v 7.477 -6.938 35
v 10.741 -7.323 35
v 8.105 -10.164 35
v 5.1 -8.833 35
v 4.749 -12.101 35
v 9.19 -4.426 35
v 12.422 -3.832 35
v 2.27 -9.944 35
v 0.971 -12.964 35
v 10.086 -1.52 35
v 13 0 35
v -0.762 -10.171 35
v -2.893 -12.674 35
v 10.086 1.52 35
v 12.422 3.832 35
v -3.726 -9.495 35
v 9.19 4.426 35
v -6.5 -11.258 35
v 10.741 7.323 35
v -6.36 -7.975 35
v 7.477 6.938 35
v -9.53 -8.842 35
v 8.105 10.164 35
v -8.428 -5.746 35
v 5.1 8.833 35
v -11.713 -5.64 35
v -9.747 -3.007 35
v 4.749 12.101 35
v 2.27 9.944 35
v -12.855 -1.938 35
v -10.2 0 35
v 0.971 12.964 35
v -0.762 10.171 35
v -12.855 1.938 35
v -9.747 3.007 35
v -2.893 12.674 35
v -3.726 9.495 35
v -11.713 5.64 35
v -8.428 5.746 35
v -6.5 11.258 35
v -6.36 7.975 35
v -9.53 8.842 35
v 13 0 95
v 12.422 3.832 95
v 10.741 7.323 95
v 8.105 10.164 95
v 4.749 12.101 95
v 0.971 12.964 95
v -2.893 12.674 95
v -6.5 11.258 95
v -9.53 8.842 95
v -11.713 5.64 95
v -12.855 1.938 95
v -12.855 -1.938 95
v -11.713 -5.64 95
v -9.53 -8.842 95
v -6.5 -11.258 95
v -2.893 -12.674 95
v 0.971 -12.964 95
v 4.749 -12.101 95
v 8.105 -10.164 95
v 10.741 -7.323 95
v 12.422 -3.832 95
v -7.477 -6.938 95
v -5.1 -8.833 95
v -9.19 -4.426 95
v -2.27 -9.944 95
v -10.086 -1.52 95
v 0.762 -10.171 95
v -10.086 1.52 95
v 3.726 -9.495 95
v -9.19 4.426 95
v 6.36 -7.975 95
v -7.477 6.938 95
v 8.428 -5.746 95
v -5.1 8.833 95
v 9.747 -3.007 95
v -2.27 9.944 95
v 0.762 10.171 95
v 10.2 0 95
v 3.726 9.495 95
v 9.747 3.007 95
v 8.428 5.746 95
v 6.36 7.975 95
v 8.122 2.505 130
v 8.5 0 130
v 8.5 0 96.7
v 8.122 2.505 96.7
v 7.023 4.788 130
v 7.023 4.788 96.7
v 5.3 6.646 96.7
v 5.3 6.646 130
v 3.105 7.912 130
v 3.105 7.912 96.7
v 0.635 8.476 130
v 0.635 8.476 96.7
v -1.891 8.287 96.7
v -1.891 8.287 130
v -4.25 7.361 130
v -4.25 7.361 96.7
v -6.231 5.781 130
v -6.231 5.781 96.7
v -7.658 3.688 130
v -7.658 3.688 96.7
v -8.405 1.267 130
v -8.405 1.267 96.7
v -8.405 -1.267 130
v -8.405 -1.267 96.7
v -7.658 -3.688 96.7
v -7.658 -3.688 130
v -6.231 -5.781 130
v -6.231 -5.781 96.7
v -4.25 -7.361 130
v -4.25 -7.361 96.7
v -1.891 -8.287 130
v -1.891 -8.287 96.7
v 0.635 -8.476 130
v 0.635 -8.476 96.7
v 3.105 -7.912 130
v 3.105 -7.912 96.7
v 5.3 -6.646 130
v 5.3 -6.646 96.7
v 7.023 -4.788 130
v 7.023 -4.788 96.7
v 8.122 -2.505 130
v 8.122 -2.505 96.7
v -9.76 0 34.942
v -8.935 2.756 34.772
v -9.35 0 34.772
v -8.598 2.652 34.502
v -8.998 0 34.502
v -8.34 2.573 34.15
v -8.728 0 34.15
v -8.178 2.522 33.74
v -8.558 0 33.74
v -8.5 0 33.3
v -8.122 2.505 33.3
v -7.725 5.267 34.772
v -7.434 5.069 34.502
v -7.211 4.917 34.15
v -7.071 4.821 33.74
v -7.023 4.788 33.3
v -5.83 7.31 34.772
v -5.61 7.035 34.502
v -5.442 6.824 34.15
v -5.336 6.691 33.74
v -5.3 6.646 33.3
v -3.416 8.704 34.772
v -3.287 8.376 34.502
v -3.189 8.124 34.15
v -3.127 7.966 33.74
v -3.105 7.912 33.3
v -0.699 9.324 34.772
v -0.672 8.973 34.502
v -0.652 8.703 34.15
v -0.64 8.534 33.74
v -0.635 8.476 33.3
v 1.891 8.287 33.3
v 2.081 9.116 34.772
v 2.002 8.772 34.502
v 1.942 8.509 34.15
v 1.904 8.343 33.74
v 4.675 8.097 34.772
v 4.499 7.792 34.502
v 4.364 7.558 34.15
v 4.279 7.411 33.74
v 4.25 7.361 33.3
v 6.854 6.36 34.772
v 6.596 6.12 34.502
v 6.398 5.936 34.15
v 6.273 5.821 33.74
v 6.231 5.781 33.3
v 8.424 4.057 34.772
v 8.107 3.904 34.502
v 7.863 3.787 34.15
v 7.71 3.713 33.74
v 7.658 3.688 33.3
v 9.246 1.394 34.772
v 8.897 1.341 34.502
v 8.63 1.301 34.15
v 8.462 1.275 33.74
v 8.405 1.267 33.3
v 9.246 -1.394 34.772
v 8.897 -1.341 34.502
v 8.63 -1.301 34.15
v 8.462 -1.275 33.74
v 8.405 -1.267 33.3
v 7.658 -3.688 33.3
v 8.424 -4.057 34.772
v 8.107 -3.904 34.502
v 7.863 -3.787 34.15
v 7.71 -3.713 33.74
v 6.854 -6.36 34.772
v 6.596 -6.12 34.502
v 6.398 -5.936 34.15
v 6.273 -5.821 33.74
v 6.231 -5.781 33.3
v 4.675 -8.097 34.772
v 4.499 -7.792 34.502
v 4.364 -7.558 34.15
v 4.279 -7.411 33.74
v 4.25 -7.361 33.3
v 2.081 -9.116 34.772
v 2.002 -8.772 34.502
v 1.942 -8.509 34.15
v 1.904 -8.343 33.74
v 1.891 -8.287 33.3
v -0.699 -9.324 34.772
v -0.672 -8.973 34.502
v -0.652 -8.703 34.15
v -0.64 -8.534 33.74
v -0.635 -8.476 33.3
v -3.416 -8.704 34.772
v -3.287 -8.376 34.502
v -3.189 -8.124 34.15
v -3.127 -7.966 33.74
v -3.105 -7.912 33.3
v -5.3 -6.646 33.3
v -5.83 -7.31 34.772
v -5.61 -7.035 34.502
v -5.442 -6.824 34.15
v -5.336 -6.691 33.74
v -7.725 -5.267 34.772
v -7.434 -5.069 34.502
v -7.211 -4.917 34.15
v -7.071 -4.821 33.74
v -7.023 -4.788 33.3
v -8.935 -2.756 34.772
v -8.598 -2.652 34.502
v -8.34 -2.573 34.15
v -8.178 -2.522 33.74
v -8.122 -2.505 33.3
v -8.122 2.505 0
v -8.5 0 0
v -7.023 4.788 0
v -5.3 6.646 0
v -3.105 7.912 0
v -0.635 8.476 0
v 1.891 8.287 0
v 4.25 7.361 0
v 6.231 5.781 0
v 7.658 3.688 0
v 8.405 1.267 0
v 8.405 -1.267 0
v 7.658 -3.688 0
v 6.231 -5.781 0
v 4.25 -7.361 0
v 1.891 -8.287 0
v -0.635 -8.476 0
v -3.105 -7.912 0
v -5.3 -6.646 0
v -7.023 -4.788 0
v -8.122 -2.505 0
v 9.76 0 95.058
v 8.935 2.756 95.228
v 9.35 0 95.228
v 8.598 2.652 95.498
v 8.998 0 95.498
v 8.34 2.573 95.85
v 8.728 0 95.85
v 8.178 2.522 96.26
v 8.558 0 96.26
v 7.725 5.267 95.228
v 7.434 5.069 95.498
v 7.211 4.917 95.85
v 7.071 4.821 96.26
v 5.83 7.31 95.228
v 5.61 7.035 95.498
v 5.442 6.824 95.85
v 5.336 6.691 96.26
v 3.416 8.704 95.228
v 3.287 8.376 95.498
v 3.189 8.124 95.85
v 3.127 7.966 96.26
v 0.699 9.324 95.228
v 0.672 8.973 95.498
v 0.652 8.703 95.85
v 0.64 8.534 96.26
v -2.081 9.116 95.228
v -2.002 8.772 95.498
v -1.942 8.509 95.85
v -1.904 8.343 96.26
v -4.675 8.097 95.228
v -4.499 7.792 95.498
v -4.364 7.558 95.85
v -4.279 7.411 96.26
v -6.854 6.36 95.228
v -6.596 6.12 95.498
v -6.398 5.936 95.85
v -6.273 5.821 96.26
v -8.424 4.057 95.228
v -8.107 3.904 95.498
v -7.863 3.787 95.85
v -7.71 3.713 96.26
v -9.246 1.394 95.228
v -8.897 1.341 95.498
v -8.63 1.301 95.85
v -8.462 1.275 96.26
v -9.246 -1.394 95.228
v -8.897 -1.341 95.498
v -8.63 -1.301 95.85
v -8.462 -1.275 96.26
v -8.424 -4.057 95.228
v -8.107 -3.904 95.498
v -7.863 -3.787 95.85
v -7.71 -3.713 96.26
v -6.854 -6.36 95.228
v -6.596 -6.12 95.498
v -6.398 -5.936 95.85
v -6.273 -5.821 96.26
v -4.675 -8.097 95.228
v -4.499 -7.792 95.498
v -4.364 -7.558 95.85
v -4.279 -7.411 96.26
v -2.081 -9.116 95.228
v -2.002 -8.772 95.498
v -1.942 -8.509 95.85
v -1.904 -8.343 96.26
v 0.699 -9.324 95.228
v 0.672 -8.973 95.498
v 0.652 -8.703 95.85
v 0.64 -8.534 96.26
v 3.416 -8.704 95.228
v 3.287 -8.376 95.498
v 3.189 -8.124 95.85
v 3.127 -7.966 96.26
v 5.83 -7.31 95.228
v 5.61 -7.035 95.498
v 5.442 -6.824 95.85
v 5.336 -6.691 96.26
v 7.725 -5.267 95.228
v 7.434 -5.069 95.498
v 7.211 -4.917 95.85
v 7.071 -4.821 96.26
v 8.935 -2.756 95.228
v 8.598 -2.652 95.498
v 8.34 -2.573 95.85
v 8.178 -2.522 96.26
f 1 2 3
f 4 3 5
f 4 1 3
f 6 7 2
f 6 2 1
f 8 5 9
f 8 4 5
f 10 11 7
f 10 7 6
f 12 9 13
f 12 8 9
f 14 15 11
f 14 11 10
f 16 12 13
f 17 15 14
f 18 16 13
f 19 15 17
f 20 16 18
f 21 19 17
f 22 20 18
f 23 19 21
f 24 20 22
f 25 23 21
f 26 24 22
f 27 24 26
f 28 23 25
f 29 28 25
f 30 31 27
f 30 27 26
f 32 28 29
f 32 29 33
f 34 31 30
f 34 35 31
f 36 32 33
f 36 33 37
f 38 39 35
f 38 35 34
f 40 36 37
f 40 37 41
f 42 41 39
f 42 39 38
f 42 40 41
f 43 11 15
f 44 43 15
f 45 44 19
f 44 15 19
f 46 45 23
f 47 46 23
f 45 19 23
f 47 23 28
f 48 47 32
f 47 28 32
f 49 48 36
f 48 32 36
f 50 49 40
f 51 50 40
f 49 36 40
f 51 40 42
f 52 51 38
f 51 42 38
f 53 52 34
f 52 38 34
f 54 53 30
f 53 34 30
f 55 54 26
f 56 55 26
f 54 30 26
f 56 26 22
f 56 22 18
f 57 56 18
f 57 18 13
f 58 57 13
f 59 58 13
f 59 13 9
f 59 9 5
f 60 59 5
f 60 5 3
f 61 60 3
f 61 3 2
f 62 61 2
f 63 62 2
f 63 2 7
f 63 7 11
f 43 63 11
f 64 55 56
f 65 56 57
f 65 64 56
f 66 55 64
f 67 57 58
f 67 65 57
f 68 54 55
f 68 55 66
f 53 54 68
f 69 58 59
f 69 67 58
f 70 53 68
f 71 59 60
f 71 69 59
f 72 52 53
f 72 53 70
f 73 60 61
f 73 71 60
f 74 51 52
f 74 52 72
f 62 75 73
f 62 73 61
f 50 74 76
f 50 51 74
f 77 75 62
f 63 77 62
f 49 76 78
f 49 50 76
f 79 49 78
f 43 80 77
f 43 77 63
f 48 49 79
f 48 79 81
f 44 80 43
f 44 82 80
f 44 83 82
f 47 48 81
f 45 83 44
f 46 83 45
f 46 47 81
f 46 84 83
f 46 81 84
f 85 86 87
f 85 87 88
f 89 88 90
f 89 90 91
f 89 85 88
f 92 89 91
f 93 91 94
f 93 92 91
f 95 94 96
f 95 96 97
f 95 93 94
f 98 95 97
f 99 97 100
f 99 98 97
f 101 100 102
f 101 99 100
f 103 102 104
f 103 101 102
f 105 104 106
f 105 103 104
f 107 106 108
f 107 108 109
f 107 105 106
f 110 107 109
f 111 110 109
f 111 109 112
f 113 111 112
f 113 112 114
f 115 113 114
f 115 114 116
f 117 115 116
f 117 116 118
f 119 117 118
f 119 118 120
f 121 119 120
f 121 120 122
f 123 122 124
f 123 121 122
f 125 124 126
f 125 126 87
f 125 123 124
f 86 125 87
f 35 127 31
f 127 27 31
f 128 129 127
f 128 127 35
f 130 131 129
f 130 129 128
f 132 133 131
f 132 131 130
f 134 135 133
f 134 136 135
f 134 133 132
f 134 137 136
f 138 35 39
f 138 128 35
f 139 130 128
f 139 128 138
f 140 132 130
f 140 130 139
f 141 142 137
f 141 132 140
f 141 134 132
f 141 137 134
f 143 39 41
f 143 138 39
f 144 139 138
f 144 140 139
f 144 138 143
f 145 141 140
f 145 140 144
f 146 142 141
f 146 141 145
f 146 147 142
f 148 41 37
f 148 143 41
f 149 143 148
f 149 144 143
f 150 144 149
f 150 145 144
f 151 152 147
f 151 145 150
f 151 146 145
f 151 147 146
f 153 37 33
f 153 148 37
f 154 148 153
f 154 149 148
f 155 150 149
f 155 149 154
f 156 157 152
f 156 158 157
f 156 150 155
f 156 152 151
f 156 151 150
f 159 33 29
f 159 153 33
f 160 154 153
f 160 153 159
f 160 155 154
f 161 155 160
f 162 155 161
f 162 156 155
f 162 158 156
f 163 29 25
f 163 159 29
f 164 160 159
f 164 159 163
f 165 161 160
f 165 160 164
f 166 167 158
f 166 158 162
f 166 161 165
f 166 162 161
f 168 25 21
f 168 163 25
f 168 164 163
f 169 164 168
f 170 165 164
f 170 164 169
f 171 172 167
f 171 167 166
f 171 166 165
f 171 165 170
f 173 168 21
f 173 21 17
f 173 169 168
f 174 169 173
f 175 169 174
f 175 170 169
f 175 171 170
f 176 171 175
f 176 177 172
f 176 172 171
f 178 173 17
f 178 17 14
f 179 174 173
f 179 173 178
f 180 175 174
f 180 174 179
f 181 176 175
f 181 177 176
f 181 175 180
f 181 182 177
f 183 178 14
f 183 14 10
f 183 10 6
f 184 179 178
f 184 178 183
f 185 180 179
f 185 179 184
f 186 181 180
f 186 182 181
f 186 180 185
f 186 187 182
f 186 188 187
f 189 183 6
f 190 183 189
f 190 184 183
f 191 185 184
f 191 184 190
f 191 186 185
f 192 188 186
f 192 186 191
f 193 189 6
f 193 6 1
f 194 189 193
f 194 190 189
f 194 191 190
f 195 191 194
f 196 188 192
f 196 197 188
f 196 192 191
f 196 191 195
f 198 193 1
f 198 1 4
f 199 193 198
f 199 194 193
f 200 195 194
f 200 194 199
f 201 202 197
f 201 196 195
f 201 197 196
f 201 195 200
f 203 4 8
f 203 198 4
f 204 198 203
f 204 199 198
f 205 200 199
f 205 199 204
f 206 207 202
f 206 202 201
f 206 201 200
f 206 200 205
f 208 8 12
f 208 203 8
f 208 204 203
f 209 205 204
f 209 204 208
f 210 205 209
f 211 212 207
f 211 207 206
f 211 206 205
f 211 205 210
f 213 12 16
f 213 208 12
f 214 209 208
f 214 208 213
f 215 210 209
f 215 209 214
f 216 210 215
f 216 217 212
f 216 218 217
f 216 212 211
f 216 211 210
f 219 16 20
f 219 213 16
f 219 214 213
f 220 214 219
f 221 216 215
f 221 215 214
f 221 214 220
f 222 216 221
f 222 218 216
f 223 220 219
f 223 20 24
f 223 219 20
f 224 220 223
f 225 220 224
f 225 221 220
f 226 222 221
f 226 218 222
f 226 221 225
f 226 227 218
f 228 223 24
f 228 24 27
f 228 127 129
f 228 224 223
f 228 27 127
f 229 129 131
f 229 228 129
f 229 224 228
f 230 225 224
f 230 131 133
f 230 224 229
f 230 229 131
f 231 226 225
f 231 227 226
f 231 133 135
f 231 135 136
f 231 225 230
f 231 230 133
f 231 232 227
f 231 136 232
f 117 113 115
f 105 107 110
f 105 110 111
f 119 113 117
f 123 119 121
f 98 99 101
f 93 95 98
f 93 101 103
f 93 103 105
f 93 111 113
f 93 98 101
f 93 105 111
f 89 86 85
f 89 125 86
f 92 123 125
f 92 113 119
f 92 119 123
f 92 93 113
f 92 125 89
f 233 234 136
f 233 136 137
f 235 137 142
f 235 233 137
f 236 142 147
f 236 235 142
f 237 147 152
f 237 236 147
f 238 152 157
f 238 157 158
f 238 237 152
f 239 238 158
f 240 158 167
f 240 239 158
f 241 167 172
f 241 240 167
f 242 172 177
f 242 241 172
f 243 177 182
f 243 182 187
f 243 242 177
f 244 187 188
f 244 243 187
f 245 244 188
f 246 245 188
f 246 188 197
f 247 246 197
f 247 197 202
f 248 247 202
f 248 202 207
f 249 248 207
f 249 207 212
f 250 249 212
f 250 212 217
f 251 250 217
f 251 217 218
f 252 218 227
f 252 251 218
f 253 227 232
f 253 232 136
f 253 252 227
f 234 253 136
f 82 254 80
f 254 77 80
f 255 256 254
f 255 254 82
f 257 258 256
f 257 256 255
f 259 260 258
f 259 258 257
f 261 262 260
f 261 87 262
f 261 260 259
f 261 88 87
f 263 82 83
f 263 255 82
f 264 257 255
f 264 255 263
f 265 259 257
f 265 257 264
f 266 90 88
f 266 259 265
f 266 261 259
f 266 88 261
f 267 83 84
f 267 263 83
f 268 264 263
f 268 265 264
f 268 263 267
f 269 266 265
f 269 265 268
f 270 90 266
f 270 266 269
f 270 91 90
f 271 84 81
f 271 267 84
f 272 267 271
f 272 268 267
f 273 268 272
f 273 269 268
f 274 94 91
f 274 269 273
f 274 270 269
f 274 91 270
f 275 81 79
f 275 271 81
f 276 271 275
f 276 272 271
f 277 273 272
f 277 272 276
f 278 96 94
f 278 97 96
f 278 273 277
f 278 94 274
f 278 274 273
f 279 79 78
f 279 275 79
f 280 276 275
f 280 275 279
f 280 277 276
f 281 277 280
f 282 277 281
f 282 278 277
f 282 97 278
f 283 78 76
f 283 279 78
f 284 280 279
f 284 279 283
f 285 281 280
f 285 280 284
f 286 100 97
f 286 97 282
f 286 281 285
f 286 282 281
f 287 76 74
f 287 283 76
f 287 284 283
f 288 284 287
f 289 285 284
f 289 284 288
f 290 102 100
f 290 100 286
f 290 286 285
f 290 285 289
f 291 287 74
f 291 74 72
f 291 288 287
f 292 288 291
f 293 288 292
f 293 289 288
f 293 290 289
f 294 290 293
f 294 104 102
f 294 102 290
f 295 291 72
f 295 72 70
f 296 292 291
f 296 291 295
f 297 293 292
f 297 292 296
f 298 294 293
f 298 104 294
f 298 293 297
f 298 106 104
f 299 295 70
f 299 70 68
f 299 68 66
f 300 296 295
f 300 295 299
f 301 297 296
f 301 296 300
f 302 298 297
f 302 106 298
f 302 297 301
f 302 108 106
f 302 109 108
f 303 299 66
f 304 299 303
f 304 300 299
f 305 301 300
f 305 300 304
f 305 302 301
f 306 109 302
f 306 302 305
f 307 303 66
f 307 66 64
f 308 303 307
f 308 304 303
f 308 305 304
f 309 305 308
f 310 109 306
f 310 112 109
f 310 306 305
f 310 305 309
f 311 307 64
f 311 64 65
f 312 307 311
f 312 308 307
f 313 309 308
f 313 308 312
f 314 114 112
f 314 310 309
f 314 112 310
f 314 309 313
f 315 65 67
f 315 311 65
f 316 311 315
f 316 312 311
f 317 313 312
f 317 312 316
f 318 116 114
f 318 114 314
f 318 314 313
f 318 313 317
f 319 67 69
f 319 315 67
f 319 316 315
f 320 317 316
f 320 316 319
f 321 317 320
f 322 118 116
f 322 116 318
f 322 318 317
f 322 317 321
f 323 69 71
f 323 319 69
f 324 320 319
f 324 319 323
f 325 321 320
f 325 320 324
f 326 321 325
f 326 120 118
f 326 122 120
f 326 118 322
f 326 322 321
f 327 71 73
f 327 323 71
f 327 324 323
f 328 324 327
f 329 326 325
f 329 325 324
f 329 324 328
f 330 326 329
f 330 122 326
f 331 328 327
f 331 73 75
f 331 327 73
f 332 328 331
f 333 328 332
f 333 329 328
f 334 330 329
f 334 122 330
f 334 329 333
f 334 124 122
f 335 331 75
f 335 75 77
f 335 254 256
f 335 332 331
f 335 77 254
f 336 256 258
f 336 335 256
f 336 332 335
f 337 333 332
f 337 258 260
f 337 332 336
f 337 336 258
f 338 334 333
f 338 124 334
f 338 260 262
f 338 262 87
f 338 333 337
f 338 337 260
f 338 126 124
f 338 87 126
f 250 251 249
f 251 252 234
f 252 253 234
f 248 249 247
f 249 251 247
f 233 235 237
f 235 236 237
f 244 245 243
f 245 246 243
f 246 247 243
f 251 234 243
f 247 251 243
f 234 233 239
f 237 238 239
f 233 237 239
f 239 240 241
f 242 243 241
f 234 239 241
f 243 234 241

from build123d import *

# Parameters (mm, degrees)
SKETCH2_R           = 13
BOSS_EXTRUDE1_DEPTH = 130
SKETCH3_R           = 13
SKETCH3_R_2         = 8.5
CUT_EXTRUDE1_DEPTH  = 35
SKETCH4_R           = 13
SKETCH4_R_2         = 8.5
CUT_EXTRUDE2_DEPTH  = 35
FILLET1_R           = 1.7
FILLET2_R           = 1.7


with BuildPart() as part:
    # Sketch2 → Boss-Extrude1 (new body)
    with BuildSketch(Plane.XY):
        Circle(SKETCH2_R)
    extrude(amount=BOSS_EXTRUDE1_DEPTH)

    # Sketch3 → Cut-Extrude1 (cut)
    with BuildSketch(Plane.XY.offset(130)):
        Circle(SKETCH3_R)
        Circle(SKETCH3_R_2, mode=Mode.SUBTRACT)
    extrude(amount=-CUT_EXTRUDE1_DEPTH, mode=Mode.SUBTRACT)

    # Sketch4 → Cut-Extrude2 (cut)
    with BuildSketch(Plane(origin=(0, 0, 0), x_dir=(-1, 0, 0), z_dir=(0, 0, -1))):
        Circle(SKETCH4_R)
        Circle(SKETCH4_R_2, mode=Mode.SUBTRACT)
    extrude(amount=-CUT_EXTRUDE2_DEPTH, mode=Mode.SUBTRACT)

    # Fillet1
    fillet1_edges = [part.edges().sort_by_distance(p)[0] for p in [
        (-8.5, 0, 95),
    ]]
    fillet(fillet1_edges, radius=FILLET1_R)

    # Fillet2
    fillet2_edges = [part.edges().sort_by_distance(p)[0] for p in [
        (8.5, 0, 35),
    ]]
    fillet(fillet2_edges, radius=FILLET2_R)


solid = part.part
